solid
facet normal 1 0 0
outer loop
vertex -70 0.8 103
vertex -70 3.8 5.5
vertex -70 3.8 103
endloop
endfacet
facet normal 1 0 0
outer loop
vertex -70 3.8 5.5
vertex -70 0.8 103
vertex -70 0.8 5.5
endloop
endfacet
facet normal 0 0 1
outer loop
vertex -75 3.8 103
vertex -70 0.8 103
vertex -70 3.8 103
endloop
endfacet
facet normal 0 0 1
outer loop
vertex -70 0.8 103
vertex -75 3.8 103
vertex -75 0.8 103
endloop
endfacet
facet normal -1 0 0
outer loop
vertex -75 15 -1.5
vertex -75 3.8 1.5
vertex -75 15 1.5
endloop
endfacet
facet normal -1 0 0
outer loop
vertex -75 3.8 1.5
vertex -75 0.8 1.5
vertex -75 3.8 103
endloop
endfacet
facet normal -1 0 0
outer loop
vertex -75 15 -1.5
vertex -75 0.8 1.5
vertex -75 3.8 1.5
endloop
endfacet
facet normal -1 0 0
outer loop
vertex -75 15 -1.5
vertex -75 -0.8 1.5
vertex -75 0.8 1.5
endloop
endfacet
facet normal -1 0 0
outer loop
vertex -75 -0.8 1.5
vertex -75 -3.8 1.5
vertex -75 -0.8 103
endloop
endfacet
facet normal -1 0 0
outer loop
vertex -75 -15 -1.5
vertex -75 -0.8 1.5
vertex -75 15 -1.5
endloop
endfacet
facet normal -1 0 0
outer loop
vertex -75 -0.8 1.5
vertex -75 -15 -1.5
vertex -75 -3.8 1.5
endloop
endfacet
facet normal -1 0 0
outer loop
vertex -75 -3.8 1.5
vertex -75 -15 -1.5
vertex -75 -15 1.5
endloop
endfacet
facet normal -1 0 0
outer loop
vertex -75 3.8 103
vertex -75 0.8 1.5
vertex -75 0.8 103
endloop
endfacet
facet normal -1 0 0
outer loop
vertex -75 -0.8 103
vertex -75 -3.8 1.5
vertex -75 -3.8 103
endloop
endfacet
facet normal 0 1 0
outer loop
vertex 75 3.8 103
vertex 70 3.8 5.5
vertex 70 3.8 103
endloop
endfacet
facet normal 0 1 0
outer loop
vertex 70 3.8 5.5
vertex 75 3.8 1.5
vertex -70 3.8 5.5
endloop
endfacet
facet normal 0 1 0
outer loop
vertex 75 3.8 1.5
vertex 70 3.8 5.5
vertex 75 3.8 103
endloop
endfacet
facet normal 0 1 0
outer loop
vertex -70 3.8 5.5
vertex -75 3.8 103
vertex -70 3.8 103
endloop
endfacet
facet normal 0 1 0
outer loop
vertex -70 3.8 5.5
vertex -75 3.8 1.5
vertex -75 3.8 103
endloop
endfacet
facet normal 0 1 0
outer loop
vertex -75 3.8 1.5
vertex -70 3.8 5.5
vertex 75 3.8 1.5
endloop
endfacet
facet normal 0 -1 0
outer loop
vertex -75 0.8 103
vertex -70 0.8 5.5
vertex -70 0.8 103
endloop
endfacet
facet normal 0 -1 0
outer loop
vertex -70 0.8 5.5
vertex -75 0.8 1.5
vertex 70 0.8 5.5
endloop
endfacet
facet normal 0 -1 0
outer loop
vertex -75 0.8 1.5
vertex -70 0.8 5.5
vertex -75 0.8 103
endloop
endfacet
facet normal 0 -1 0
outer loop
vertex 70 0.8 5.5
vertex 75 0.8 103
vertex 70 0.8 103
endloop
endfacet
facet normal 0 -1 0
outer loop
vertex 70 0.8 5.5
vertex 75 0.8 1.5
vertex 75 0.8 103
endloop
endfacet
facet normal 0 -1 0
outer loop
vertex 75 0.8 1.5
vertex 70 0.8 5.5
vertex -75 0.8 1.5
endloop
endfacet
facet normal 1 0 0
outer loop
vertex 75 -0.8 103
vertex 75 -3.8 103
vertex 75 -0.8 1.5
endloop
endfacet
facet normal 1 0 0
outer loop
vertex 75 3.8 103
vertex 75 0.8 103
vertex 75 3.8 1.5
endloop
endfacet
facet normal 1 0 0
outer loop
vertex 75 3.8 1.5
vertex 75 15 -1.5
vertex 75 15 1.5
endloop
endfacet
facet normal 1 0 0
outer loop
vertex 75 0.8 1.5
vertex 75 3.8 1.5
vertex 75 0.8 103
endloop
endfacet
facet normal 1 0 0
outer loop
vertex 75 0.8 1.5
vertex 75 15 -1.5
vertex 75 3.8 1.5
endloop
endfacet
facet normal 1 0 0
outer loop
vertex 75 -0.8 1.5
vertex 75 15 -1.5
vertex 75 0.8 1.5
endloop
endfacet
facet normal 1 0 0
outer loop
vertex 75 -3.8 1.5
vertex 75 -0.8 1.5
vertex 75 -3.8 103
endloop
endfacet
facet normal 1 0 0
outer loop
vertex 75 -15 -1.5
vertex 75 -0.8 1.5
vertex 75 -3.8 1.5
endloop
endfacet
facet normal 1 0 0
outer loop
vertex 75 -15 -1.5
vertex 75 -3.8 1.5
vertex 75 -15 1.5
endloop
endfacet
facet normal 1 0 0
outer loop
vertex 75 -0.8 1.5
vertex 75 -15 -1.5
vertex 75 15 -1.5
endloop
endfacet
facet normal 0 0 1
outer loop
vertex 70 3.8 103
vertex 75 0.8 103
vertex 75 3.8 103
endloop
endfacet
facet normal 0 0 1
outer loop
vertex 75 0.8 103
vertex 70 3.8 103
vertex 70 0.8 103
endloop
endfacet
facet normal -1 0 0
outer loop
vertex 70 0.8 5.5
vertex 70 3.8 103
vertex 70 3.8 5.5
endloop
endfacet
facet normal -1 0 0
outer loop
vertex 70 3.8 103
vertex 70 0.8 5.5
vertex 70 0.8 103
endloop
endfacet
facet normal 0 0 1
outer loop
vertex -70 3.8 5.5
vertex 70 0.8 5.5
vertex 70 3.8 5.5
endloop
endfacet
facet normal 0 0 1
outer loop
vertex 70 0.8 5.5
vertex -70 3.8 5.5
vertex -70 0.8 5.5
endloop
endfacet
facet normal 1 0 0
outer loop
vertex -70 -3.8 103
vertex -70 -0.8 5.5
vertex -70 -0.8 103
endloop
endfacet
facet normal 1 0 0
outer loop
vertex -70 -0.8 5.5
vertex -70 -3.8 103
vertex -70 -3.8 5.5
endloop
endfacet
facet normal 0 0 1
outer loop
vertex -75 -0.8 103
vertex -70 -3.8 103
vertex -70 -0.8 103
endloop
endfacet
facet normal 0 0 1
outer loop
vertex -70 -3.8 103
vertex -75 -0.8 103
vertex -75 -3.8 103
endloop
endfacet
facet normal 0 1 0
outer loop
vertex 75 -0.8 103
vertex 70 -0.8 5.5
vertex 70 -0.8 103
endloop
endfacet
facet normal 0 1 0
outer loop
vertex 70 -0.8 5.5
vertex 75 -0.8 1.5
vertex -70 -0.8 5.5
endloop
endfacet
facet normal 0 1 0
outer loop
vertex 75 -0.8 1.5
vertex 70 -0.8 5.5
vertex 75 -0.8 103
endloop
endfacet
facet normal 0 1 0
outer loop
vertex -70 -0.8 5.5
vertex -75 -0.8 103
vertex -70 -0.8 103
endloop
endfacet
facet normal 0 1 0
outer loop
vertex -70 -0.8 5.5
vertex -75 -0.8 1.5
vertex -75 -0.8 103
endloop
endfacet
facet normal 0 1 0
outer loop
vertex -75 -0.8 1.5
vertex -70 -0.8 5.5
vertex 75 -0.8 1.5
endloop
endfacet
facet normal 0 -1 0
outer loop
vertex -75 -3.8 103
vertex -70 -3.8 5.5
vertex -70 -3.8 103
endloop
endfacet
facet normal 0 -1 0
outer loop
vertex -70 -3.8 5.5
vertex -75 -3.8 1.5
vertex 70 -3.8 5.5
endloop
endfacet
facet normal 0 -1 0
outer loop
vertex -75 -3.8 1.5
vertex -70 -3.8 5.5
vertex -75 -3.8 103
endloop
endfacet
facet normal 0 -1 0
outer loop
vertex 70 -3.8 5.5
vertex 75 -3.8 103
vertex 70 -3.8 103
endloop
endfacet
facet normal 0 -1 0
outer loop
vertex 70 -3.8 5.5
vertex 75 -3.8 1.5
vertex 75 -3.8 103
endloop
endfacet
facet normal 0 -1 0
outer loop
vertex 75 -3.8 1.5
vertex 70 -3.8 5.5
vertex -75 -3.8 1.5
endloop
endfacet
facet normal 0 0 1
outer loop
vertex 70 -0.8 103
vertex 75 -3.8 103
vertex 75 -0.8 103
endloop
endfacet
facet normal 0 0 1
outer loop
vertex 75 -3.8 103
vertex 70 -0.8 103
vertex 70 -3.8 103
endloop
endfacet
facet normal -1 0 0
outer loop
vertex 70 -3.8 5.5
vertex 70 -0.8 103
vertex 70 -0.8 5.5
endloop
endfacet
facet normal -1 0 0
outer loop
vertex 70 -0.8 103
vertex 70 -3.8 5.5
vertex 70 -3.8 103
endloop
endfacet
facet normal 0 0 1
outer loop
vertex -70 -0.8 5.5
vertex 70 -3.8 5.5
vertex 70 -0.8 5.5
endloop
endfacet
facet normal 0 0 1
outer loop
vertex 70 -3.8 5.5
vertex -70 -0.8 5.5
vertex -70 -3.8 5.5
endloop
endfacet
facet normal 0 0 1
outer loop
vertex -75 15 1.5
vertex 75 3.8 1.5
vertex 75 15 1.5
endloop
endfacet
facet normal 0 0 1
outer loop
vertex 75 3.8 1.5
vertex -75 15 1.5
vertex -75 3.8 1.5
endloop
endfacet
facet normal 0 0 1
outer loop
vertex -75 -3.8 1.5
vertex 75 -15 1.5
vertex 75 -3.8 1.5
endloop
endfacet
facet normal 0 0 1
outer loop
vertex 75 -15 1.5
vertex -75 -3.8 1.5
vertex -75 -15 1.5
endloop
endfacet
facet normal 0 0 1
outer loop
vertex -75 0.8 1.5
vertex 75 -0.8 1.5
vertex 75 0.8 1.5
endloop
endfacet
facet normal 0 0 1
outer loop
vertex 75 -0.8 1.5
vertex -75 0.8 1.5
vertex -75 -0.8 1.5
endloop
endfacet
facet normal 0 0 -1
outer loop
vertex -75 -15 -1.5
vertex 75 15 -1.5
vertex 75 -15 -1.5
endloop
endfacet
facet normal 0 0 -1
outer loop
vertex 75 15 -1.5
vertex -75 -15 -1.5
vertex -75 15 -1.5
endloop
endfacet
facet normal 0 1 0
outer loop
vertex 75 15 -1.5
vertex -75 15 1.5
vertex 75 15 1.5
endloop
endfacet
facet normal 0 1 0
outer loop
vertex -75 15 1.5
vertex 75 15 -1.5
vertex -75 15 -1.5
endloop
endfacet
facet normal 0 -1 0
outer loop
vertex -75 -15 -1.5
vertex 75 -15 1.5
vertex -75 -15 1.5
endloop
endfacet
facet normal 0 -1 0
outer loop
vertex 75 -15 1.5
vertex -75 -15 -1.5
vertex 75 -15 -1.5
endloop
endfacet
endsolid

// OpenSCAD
flaw = 1.6;

cube([150, 30, 3], center=true);

translate([0, 0, 3]) {
  
  translate([0, 1.5+flaw/2, 0]) {
    cube([150, 3, 5], center=true);
    translate([0, 0, 50]) {
      translate([-75+2.5, 0, 0]) {
        cube([5, 3, 100], center=true);
      }
      translate([75-2.5, 0, 0]) {
        cube([5, 3, 100], center=true);
      }
    }
  }
  translate([0, -1.5-flaw/2, 0]) {
    cube([150, 3, 5], center=true);
    translate([0, 0, 50]) {
      translate([-75+2.5, 0, 0]) {
        cube([5, 3, 100], center=true);
      }
      translate([75-2.5, 0, 0]) {
        cube([5, 3, 100], center=true);
      }
    }
  }
  
}
